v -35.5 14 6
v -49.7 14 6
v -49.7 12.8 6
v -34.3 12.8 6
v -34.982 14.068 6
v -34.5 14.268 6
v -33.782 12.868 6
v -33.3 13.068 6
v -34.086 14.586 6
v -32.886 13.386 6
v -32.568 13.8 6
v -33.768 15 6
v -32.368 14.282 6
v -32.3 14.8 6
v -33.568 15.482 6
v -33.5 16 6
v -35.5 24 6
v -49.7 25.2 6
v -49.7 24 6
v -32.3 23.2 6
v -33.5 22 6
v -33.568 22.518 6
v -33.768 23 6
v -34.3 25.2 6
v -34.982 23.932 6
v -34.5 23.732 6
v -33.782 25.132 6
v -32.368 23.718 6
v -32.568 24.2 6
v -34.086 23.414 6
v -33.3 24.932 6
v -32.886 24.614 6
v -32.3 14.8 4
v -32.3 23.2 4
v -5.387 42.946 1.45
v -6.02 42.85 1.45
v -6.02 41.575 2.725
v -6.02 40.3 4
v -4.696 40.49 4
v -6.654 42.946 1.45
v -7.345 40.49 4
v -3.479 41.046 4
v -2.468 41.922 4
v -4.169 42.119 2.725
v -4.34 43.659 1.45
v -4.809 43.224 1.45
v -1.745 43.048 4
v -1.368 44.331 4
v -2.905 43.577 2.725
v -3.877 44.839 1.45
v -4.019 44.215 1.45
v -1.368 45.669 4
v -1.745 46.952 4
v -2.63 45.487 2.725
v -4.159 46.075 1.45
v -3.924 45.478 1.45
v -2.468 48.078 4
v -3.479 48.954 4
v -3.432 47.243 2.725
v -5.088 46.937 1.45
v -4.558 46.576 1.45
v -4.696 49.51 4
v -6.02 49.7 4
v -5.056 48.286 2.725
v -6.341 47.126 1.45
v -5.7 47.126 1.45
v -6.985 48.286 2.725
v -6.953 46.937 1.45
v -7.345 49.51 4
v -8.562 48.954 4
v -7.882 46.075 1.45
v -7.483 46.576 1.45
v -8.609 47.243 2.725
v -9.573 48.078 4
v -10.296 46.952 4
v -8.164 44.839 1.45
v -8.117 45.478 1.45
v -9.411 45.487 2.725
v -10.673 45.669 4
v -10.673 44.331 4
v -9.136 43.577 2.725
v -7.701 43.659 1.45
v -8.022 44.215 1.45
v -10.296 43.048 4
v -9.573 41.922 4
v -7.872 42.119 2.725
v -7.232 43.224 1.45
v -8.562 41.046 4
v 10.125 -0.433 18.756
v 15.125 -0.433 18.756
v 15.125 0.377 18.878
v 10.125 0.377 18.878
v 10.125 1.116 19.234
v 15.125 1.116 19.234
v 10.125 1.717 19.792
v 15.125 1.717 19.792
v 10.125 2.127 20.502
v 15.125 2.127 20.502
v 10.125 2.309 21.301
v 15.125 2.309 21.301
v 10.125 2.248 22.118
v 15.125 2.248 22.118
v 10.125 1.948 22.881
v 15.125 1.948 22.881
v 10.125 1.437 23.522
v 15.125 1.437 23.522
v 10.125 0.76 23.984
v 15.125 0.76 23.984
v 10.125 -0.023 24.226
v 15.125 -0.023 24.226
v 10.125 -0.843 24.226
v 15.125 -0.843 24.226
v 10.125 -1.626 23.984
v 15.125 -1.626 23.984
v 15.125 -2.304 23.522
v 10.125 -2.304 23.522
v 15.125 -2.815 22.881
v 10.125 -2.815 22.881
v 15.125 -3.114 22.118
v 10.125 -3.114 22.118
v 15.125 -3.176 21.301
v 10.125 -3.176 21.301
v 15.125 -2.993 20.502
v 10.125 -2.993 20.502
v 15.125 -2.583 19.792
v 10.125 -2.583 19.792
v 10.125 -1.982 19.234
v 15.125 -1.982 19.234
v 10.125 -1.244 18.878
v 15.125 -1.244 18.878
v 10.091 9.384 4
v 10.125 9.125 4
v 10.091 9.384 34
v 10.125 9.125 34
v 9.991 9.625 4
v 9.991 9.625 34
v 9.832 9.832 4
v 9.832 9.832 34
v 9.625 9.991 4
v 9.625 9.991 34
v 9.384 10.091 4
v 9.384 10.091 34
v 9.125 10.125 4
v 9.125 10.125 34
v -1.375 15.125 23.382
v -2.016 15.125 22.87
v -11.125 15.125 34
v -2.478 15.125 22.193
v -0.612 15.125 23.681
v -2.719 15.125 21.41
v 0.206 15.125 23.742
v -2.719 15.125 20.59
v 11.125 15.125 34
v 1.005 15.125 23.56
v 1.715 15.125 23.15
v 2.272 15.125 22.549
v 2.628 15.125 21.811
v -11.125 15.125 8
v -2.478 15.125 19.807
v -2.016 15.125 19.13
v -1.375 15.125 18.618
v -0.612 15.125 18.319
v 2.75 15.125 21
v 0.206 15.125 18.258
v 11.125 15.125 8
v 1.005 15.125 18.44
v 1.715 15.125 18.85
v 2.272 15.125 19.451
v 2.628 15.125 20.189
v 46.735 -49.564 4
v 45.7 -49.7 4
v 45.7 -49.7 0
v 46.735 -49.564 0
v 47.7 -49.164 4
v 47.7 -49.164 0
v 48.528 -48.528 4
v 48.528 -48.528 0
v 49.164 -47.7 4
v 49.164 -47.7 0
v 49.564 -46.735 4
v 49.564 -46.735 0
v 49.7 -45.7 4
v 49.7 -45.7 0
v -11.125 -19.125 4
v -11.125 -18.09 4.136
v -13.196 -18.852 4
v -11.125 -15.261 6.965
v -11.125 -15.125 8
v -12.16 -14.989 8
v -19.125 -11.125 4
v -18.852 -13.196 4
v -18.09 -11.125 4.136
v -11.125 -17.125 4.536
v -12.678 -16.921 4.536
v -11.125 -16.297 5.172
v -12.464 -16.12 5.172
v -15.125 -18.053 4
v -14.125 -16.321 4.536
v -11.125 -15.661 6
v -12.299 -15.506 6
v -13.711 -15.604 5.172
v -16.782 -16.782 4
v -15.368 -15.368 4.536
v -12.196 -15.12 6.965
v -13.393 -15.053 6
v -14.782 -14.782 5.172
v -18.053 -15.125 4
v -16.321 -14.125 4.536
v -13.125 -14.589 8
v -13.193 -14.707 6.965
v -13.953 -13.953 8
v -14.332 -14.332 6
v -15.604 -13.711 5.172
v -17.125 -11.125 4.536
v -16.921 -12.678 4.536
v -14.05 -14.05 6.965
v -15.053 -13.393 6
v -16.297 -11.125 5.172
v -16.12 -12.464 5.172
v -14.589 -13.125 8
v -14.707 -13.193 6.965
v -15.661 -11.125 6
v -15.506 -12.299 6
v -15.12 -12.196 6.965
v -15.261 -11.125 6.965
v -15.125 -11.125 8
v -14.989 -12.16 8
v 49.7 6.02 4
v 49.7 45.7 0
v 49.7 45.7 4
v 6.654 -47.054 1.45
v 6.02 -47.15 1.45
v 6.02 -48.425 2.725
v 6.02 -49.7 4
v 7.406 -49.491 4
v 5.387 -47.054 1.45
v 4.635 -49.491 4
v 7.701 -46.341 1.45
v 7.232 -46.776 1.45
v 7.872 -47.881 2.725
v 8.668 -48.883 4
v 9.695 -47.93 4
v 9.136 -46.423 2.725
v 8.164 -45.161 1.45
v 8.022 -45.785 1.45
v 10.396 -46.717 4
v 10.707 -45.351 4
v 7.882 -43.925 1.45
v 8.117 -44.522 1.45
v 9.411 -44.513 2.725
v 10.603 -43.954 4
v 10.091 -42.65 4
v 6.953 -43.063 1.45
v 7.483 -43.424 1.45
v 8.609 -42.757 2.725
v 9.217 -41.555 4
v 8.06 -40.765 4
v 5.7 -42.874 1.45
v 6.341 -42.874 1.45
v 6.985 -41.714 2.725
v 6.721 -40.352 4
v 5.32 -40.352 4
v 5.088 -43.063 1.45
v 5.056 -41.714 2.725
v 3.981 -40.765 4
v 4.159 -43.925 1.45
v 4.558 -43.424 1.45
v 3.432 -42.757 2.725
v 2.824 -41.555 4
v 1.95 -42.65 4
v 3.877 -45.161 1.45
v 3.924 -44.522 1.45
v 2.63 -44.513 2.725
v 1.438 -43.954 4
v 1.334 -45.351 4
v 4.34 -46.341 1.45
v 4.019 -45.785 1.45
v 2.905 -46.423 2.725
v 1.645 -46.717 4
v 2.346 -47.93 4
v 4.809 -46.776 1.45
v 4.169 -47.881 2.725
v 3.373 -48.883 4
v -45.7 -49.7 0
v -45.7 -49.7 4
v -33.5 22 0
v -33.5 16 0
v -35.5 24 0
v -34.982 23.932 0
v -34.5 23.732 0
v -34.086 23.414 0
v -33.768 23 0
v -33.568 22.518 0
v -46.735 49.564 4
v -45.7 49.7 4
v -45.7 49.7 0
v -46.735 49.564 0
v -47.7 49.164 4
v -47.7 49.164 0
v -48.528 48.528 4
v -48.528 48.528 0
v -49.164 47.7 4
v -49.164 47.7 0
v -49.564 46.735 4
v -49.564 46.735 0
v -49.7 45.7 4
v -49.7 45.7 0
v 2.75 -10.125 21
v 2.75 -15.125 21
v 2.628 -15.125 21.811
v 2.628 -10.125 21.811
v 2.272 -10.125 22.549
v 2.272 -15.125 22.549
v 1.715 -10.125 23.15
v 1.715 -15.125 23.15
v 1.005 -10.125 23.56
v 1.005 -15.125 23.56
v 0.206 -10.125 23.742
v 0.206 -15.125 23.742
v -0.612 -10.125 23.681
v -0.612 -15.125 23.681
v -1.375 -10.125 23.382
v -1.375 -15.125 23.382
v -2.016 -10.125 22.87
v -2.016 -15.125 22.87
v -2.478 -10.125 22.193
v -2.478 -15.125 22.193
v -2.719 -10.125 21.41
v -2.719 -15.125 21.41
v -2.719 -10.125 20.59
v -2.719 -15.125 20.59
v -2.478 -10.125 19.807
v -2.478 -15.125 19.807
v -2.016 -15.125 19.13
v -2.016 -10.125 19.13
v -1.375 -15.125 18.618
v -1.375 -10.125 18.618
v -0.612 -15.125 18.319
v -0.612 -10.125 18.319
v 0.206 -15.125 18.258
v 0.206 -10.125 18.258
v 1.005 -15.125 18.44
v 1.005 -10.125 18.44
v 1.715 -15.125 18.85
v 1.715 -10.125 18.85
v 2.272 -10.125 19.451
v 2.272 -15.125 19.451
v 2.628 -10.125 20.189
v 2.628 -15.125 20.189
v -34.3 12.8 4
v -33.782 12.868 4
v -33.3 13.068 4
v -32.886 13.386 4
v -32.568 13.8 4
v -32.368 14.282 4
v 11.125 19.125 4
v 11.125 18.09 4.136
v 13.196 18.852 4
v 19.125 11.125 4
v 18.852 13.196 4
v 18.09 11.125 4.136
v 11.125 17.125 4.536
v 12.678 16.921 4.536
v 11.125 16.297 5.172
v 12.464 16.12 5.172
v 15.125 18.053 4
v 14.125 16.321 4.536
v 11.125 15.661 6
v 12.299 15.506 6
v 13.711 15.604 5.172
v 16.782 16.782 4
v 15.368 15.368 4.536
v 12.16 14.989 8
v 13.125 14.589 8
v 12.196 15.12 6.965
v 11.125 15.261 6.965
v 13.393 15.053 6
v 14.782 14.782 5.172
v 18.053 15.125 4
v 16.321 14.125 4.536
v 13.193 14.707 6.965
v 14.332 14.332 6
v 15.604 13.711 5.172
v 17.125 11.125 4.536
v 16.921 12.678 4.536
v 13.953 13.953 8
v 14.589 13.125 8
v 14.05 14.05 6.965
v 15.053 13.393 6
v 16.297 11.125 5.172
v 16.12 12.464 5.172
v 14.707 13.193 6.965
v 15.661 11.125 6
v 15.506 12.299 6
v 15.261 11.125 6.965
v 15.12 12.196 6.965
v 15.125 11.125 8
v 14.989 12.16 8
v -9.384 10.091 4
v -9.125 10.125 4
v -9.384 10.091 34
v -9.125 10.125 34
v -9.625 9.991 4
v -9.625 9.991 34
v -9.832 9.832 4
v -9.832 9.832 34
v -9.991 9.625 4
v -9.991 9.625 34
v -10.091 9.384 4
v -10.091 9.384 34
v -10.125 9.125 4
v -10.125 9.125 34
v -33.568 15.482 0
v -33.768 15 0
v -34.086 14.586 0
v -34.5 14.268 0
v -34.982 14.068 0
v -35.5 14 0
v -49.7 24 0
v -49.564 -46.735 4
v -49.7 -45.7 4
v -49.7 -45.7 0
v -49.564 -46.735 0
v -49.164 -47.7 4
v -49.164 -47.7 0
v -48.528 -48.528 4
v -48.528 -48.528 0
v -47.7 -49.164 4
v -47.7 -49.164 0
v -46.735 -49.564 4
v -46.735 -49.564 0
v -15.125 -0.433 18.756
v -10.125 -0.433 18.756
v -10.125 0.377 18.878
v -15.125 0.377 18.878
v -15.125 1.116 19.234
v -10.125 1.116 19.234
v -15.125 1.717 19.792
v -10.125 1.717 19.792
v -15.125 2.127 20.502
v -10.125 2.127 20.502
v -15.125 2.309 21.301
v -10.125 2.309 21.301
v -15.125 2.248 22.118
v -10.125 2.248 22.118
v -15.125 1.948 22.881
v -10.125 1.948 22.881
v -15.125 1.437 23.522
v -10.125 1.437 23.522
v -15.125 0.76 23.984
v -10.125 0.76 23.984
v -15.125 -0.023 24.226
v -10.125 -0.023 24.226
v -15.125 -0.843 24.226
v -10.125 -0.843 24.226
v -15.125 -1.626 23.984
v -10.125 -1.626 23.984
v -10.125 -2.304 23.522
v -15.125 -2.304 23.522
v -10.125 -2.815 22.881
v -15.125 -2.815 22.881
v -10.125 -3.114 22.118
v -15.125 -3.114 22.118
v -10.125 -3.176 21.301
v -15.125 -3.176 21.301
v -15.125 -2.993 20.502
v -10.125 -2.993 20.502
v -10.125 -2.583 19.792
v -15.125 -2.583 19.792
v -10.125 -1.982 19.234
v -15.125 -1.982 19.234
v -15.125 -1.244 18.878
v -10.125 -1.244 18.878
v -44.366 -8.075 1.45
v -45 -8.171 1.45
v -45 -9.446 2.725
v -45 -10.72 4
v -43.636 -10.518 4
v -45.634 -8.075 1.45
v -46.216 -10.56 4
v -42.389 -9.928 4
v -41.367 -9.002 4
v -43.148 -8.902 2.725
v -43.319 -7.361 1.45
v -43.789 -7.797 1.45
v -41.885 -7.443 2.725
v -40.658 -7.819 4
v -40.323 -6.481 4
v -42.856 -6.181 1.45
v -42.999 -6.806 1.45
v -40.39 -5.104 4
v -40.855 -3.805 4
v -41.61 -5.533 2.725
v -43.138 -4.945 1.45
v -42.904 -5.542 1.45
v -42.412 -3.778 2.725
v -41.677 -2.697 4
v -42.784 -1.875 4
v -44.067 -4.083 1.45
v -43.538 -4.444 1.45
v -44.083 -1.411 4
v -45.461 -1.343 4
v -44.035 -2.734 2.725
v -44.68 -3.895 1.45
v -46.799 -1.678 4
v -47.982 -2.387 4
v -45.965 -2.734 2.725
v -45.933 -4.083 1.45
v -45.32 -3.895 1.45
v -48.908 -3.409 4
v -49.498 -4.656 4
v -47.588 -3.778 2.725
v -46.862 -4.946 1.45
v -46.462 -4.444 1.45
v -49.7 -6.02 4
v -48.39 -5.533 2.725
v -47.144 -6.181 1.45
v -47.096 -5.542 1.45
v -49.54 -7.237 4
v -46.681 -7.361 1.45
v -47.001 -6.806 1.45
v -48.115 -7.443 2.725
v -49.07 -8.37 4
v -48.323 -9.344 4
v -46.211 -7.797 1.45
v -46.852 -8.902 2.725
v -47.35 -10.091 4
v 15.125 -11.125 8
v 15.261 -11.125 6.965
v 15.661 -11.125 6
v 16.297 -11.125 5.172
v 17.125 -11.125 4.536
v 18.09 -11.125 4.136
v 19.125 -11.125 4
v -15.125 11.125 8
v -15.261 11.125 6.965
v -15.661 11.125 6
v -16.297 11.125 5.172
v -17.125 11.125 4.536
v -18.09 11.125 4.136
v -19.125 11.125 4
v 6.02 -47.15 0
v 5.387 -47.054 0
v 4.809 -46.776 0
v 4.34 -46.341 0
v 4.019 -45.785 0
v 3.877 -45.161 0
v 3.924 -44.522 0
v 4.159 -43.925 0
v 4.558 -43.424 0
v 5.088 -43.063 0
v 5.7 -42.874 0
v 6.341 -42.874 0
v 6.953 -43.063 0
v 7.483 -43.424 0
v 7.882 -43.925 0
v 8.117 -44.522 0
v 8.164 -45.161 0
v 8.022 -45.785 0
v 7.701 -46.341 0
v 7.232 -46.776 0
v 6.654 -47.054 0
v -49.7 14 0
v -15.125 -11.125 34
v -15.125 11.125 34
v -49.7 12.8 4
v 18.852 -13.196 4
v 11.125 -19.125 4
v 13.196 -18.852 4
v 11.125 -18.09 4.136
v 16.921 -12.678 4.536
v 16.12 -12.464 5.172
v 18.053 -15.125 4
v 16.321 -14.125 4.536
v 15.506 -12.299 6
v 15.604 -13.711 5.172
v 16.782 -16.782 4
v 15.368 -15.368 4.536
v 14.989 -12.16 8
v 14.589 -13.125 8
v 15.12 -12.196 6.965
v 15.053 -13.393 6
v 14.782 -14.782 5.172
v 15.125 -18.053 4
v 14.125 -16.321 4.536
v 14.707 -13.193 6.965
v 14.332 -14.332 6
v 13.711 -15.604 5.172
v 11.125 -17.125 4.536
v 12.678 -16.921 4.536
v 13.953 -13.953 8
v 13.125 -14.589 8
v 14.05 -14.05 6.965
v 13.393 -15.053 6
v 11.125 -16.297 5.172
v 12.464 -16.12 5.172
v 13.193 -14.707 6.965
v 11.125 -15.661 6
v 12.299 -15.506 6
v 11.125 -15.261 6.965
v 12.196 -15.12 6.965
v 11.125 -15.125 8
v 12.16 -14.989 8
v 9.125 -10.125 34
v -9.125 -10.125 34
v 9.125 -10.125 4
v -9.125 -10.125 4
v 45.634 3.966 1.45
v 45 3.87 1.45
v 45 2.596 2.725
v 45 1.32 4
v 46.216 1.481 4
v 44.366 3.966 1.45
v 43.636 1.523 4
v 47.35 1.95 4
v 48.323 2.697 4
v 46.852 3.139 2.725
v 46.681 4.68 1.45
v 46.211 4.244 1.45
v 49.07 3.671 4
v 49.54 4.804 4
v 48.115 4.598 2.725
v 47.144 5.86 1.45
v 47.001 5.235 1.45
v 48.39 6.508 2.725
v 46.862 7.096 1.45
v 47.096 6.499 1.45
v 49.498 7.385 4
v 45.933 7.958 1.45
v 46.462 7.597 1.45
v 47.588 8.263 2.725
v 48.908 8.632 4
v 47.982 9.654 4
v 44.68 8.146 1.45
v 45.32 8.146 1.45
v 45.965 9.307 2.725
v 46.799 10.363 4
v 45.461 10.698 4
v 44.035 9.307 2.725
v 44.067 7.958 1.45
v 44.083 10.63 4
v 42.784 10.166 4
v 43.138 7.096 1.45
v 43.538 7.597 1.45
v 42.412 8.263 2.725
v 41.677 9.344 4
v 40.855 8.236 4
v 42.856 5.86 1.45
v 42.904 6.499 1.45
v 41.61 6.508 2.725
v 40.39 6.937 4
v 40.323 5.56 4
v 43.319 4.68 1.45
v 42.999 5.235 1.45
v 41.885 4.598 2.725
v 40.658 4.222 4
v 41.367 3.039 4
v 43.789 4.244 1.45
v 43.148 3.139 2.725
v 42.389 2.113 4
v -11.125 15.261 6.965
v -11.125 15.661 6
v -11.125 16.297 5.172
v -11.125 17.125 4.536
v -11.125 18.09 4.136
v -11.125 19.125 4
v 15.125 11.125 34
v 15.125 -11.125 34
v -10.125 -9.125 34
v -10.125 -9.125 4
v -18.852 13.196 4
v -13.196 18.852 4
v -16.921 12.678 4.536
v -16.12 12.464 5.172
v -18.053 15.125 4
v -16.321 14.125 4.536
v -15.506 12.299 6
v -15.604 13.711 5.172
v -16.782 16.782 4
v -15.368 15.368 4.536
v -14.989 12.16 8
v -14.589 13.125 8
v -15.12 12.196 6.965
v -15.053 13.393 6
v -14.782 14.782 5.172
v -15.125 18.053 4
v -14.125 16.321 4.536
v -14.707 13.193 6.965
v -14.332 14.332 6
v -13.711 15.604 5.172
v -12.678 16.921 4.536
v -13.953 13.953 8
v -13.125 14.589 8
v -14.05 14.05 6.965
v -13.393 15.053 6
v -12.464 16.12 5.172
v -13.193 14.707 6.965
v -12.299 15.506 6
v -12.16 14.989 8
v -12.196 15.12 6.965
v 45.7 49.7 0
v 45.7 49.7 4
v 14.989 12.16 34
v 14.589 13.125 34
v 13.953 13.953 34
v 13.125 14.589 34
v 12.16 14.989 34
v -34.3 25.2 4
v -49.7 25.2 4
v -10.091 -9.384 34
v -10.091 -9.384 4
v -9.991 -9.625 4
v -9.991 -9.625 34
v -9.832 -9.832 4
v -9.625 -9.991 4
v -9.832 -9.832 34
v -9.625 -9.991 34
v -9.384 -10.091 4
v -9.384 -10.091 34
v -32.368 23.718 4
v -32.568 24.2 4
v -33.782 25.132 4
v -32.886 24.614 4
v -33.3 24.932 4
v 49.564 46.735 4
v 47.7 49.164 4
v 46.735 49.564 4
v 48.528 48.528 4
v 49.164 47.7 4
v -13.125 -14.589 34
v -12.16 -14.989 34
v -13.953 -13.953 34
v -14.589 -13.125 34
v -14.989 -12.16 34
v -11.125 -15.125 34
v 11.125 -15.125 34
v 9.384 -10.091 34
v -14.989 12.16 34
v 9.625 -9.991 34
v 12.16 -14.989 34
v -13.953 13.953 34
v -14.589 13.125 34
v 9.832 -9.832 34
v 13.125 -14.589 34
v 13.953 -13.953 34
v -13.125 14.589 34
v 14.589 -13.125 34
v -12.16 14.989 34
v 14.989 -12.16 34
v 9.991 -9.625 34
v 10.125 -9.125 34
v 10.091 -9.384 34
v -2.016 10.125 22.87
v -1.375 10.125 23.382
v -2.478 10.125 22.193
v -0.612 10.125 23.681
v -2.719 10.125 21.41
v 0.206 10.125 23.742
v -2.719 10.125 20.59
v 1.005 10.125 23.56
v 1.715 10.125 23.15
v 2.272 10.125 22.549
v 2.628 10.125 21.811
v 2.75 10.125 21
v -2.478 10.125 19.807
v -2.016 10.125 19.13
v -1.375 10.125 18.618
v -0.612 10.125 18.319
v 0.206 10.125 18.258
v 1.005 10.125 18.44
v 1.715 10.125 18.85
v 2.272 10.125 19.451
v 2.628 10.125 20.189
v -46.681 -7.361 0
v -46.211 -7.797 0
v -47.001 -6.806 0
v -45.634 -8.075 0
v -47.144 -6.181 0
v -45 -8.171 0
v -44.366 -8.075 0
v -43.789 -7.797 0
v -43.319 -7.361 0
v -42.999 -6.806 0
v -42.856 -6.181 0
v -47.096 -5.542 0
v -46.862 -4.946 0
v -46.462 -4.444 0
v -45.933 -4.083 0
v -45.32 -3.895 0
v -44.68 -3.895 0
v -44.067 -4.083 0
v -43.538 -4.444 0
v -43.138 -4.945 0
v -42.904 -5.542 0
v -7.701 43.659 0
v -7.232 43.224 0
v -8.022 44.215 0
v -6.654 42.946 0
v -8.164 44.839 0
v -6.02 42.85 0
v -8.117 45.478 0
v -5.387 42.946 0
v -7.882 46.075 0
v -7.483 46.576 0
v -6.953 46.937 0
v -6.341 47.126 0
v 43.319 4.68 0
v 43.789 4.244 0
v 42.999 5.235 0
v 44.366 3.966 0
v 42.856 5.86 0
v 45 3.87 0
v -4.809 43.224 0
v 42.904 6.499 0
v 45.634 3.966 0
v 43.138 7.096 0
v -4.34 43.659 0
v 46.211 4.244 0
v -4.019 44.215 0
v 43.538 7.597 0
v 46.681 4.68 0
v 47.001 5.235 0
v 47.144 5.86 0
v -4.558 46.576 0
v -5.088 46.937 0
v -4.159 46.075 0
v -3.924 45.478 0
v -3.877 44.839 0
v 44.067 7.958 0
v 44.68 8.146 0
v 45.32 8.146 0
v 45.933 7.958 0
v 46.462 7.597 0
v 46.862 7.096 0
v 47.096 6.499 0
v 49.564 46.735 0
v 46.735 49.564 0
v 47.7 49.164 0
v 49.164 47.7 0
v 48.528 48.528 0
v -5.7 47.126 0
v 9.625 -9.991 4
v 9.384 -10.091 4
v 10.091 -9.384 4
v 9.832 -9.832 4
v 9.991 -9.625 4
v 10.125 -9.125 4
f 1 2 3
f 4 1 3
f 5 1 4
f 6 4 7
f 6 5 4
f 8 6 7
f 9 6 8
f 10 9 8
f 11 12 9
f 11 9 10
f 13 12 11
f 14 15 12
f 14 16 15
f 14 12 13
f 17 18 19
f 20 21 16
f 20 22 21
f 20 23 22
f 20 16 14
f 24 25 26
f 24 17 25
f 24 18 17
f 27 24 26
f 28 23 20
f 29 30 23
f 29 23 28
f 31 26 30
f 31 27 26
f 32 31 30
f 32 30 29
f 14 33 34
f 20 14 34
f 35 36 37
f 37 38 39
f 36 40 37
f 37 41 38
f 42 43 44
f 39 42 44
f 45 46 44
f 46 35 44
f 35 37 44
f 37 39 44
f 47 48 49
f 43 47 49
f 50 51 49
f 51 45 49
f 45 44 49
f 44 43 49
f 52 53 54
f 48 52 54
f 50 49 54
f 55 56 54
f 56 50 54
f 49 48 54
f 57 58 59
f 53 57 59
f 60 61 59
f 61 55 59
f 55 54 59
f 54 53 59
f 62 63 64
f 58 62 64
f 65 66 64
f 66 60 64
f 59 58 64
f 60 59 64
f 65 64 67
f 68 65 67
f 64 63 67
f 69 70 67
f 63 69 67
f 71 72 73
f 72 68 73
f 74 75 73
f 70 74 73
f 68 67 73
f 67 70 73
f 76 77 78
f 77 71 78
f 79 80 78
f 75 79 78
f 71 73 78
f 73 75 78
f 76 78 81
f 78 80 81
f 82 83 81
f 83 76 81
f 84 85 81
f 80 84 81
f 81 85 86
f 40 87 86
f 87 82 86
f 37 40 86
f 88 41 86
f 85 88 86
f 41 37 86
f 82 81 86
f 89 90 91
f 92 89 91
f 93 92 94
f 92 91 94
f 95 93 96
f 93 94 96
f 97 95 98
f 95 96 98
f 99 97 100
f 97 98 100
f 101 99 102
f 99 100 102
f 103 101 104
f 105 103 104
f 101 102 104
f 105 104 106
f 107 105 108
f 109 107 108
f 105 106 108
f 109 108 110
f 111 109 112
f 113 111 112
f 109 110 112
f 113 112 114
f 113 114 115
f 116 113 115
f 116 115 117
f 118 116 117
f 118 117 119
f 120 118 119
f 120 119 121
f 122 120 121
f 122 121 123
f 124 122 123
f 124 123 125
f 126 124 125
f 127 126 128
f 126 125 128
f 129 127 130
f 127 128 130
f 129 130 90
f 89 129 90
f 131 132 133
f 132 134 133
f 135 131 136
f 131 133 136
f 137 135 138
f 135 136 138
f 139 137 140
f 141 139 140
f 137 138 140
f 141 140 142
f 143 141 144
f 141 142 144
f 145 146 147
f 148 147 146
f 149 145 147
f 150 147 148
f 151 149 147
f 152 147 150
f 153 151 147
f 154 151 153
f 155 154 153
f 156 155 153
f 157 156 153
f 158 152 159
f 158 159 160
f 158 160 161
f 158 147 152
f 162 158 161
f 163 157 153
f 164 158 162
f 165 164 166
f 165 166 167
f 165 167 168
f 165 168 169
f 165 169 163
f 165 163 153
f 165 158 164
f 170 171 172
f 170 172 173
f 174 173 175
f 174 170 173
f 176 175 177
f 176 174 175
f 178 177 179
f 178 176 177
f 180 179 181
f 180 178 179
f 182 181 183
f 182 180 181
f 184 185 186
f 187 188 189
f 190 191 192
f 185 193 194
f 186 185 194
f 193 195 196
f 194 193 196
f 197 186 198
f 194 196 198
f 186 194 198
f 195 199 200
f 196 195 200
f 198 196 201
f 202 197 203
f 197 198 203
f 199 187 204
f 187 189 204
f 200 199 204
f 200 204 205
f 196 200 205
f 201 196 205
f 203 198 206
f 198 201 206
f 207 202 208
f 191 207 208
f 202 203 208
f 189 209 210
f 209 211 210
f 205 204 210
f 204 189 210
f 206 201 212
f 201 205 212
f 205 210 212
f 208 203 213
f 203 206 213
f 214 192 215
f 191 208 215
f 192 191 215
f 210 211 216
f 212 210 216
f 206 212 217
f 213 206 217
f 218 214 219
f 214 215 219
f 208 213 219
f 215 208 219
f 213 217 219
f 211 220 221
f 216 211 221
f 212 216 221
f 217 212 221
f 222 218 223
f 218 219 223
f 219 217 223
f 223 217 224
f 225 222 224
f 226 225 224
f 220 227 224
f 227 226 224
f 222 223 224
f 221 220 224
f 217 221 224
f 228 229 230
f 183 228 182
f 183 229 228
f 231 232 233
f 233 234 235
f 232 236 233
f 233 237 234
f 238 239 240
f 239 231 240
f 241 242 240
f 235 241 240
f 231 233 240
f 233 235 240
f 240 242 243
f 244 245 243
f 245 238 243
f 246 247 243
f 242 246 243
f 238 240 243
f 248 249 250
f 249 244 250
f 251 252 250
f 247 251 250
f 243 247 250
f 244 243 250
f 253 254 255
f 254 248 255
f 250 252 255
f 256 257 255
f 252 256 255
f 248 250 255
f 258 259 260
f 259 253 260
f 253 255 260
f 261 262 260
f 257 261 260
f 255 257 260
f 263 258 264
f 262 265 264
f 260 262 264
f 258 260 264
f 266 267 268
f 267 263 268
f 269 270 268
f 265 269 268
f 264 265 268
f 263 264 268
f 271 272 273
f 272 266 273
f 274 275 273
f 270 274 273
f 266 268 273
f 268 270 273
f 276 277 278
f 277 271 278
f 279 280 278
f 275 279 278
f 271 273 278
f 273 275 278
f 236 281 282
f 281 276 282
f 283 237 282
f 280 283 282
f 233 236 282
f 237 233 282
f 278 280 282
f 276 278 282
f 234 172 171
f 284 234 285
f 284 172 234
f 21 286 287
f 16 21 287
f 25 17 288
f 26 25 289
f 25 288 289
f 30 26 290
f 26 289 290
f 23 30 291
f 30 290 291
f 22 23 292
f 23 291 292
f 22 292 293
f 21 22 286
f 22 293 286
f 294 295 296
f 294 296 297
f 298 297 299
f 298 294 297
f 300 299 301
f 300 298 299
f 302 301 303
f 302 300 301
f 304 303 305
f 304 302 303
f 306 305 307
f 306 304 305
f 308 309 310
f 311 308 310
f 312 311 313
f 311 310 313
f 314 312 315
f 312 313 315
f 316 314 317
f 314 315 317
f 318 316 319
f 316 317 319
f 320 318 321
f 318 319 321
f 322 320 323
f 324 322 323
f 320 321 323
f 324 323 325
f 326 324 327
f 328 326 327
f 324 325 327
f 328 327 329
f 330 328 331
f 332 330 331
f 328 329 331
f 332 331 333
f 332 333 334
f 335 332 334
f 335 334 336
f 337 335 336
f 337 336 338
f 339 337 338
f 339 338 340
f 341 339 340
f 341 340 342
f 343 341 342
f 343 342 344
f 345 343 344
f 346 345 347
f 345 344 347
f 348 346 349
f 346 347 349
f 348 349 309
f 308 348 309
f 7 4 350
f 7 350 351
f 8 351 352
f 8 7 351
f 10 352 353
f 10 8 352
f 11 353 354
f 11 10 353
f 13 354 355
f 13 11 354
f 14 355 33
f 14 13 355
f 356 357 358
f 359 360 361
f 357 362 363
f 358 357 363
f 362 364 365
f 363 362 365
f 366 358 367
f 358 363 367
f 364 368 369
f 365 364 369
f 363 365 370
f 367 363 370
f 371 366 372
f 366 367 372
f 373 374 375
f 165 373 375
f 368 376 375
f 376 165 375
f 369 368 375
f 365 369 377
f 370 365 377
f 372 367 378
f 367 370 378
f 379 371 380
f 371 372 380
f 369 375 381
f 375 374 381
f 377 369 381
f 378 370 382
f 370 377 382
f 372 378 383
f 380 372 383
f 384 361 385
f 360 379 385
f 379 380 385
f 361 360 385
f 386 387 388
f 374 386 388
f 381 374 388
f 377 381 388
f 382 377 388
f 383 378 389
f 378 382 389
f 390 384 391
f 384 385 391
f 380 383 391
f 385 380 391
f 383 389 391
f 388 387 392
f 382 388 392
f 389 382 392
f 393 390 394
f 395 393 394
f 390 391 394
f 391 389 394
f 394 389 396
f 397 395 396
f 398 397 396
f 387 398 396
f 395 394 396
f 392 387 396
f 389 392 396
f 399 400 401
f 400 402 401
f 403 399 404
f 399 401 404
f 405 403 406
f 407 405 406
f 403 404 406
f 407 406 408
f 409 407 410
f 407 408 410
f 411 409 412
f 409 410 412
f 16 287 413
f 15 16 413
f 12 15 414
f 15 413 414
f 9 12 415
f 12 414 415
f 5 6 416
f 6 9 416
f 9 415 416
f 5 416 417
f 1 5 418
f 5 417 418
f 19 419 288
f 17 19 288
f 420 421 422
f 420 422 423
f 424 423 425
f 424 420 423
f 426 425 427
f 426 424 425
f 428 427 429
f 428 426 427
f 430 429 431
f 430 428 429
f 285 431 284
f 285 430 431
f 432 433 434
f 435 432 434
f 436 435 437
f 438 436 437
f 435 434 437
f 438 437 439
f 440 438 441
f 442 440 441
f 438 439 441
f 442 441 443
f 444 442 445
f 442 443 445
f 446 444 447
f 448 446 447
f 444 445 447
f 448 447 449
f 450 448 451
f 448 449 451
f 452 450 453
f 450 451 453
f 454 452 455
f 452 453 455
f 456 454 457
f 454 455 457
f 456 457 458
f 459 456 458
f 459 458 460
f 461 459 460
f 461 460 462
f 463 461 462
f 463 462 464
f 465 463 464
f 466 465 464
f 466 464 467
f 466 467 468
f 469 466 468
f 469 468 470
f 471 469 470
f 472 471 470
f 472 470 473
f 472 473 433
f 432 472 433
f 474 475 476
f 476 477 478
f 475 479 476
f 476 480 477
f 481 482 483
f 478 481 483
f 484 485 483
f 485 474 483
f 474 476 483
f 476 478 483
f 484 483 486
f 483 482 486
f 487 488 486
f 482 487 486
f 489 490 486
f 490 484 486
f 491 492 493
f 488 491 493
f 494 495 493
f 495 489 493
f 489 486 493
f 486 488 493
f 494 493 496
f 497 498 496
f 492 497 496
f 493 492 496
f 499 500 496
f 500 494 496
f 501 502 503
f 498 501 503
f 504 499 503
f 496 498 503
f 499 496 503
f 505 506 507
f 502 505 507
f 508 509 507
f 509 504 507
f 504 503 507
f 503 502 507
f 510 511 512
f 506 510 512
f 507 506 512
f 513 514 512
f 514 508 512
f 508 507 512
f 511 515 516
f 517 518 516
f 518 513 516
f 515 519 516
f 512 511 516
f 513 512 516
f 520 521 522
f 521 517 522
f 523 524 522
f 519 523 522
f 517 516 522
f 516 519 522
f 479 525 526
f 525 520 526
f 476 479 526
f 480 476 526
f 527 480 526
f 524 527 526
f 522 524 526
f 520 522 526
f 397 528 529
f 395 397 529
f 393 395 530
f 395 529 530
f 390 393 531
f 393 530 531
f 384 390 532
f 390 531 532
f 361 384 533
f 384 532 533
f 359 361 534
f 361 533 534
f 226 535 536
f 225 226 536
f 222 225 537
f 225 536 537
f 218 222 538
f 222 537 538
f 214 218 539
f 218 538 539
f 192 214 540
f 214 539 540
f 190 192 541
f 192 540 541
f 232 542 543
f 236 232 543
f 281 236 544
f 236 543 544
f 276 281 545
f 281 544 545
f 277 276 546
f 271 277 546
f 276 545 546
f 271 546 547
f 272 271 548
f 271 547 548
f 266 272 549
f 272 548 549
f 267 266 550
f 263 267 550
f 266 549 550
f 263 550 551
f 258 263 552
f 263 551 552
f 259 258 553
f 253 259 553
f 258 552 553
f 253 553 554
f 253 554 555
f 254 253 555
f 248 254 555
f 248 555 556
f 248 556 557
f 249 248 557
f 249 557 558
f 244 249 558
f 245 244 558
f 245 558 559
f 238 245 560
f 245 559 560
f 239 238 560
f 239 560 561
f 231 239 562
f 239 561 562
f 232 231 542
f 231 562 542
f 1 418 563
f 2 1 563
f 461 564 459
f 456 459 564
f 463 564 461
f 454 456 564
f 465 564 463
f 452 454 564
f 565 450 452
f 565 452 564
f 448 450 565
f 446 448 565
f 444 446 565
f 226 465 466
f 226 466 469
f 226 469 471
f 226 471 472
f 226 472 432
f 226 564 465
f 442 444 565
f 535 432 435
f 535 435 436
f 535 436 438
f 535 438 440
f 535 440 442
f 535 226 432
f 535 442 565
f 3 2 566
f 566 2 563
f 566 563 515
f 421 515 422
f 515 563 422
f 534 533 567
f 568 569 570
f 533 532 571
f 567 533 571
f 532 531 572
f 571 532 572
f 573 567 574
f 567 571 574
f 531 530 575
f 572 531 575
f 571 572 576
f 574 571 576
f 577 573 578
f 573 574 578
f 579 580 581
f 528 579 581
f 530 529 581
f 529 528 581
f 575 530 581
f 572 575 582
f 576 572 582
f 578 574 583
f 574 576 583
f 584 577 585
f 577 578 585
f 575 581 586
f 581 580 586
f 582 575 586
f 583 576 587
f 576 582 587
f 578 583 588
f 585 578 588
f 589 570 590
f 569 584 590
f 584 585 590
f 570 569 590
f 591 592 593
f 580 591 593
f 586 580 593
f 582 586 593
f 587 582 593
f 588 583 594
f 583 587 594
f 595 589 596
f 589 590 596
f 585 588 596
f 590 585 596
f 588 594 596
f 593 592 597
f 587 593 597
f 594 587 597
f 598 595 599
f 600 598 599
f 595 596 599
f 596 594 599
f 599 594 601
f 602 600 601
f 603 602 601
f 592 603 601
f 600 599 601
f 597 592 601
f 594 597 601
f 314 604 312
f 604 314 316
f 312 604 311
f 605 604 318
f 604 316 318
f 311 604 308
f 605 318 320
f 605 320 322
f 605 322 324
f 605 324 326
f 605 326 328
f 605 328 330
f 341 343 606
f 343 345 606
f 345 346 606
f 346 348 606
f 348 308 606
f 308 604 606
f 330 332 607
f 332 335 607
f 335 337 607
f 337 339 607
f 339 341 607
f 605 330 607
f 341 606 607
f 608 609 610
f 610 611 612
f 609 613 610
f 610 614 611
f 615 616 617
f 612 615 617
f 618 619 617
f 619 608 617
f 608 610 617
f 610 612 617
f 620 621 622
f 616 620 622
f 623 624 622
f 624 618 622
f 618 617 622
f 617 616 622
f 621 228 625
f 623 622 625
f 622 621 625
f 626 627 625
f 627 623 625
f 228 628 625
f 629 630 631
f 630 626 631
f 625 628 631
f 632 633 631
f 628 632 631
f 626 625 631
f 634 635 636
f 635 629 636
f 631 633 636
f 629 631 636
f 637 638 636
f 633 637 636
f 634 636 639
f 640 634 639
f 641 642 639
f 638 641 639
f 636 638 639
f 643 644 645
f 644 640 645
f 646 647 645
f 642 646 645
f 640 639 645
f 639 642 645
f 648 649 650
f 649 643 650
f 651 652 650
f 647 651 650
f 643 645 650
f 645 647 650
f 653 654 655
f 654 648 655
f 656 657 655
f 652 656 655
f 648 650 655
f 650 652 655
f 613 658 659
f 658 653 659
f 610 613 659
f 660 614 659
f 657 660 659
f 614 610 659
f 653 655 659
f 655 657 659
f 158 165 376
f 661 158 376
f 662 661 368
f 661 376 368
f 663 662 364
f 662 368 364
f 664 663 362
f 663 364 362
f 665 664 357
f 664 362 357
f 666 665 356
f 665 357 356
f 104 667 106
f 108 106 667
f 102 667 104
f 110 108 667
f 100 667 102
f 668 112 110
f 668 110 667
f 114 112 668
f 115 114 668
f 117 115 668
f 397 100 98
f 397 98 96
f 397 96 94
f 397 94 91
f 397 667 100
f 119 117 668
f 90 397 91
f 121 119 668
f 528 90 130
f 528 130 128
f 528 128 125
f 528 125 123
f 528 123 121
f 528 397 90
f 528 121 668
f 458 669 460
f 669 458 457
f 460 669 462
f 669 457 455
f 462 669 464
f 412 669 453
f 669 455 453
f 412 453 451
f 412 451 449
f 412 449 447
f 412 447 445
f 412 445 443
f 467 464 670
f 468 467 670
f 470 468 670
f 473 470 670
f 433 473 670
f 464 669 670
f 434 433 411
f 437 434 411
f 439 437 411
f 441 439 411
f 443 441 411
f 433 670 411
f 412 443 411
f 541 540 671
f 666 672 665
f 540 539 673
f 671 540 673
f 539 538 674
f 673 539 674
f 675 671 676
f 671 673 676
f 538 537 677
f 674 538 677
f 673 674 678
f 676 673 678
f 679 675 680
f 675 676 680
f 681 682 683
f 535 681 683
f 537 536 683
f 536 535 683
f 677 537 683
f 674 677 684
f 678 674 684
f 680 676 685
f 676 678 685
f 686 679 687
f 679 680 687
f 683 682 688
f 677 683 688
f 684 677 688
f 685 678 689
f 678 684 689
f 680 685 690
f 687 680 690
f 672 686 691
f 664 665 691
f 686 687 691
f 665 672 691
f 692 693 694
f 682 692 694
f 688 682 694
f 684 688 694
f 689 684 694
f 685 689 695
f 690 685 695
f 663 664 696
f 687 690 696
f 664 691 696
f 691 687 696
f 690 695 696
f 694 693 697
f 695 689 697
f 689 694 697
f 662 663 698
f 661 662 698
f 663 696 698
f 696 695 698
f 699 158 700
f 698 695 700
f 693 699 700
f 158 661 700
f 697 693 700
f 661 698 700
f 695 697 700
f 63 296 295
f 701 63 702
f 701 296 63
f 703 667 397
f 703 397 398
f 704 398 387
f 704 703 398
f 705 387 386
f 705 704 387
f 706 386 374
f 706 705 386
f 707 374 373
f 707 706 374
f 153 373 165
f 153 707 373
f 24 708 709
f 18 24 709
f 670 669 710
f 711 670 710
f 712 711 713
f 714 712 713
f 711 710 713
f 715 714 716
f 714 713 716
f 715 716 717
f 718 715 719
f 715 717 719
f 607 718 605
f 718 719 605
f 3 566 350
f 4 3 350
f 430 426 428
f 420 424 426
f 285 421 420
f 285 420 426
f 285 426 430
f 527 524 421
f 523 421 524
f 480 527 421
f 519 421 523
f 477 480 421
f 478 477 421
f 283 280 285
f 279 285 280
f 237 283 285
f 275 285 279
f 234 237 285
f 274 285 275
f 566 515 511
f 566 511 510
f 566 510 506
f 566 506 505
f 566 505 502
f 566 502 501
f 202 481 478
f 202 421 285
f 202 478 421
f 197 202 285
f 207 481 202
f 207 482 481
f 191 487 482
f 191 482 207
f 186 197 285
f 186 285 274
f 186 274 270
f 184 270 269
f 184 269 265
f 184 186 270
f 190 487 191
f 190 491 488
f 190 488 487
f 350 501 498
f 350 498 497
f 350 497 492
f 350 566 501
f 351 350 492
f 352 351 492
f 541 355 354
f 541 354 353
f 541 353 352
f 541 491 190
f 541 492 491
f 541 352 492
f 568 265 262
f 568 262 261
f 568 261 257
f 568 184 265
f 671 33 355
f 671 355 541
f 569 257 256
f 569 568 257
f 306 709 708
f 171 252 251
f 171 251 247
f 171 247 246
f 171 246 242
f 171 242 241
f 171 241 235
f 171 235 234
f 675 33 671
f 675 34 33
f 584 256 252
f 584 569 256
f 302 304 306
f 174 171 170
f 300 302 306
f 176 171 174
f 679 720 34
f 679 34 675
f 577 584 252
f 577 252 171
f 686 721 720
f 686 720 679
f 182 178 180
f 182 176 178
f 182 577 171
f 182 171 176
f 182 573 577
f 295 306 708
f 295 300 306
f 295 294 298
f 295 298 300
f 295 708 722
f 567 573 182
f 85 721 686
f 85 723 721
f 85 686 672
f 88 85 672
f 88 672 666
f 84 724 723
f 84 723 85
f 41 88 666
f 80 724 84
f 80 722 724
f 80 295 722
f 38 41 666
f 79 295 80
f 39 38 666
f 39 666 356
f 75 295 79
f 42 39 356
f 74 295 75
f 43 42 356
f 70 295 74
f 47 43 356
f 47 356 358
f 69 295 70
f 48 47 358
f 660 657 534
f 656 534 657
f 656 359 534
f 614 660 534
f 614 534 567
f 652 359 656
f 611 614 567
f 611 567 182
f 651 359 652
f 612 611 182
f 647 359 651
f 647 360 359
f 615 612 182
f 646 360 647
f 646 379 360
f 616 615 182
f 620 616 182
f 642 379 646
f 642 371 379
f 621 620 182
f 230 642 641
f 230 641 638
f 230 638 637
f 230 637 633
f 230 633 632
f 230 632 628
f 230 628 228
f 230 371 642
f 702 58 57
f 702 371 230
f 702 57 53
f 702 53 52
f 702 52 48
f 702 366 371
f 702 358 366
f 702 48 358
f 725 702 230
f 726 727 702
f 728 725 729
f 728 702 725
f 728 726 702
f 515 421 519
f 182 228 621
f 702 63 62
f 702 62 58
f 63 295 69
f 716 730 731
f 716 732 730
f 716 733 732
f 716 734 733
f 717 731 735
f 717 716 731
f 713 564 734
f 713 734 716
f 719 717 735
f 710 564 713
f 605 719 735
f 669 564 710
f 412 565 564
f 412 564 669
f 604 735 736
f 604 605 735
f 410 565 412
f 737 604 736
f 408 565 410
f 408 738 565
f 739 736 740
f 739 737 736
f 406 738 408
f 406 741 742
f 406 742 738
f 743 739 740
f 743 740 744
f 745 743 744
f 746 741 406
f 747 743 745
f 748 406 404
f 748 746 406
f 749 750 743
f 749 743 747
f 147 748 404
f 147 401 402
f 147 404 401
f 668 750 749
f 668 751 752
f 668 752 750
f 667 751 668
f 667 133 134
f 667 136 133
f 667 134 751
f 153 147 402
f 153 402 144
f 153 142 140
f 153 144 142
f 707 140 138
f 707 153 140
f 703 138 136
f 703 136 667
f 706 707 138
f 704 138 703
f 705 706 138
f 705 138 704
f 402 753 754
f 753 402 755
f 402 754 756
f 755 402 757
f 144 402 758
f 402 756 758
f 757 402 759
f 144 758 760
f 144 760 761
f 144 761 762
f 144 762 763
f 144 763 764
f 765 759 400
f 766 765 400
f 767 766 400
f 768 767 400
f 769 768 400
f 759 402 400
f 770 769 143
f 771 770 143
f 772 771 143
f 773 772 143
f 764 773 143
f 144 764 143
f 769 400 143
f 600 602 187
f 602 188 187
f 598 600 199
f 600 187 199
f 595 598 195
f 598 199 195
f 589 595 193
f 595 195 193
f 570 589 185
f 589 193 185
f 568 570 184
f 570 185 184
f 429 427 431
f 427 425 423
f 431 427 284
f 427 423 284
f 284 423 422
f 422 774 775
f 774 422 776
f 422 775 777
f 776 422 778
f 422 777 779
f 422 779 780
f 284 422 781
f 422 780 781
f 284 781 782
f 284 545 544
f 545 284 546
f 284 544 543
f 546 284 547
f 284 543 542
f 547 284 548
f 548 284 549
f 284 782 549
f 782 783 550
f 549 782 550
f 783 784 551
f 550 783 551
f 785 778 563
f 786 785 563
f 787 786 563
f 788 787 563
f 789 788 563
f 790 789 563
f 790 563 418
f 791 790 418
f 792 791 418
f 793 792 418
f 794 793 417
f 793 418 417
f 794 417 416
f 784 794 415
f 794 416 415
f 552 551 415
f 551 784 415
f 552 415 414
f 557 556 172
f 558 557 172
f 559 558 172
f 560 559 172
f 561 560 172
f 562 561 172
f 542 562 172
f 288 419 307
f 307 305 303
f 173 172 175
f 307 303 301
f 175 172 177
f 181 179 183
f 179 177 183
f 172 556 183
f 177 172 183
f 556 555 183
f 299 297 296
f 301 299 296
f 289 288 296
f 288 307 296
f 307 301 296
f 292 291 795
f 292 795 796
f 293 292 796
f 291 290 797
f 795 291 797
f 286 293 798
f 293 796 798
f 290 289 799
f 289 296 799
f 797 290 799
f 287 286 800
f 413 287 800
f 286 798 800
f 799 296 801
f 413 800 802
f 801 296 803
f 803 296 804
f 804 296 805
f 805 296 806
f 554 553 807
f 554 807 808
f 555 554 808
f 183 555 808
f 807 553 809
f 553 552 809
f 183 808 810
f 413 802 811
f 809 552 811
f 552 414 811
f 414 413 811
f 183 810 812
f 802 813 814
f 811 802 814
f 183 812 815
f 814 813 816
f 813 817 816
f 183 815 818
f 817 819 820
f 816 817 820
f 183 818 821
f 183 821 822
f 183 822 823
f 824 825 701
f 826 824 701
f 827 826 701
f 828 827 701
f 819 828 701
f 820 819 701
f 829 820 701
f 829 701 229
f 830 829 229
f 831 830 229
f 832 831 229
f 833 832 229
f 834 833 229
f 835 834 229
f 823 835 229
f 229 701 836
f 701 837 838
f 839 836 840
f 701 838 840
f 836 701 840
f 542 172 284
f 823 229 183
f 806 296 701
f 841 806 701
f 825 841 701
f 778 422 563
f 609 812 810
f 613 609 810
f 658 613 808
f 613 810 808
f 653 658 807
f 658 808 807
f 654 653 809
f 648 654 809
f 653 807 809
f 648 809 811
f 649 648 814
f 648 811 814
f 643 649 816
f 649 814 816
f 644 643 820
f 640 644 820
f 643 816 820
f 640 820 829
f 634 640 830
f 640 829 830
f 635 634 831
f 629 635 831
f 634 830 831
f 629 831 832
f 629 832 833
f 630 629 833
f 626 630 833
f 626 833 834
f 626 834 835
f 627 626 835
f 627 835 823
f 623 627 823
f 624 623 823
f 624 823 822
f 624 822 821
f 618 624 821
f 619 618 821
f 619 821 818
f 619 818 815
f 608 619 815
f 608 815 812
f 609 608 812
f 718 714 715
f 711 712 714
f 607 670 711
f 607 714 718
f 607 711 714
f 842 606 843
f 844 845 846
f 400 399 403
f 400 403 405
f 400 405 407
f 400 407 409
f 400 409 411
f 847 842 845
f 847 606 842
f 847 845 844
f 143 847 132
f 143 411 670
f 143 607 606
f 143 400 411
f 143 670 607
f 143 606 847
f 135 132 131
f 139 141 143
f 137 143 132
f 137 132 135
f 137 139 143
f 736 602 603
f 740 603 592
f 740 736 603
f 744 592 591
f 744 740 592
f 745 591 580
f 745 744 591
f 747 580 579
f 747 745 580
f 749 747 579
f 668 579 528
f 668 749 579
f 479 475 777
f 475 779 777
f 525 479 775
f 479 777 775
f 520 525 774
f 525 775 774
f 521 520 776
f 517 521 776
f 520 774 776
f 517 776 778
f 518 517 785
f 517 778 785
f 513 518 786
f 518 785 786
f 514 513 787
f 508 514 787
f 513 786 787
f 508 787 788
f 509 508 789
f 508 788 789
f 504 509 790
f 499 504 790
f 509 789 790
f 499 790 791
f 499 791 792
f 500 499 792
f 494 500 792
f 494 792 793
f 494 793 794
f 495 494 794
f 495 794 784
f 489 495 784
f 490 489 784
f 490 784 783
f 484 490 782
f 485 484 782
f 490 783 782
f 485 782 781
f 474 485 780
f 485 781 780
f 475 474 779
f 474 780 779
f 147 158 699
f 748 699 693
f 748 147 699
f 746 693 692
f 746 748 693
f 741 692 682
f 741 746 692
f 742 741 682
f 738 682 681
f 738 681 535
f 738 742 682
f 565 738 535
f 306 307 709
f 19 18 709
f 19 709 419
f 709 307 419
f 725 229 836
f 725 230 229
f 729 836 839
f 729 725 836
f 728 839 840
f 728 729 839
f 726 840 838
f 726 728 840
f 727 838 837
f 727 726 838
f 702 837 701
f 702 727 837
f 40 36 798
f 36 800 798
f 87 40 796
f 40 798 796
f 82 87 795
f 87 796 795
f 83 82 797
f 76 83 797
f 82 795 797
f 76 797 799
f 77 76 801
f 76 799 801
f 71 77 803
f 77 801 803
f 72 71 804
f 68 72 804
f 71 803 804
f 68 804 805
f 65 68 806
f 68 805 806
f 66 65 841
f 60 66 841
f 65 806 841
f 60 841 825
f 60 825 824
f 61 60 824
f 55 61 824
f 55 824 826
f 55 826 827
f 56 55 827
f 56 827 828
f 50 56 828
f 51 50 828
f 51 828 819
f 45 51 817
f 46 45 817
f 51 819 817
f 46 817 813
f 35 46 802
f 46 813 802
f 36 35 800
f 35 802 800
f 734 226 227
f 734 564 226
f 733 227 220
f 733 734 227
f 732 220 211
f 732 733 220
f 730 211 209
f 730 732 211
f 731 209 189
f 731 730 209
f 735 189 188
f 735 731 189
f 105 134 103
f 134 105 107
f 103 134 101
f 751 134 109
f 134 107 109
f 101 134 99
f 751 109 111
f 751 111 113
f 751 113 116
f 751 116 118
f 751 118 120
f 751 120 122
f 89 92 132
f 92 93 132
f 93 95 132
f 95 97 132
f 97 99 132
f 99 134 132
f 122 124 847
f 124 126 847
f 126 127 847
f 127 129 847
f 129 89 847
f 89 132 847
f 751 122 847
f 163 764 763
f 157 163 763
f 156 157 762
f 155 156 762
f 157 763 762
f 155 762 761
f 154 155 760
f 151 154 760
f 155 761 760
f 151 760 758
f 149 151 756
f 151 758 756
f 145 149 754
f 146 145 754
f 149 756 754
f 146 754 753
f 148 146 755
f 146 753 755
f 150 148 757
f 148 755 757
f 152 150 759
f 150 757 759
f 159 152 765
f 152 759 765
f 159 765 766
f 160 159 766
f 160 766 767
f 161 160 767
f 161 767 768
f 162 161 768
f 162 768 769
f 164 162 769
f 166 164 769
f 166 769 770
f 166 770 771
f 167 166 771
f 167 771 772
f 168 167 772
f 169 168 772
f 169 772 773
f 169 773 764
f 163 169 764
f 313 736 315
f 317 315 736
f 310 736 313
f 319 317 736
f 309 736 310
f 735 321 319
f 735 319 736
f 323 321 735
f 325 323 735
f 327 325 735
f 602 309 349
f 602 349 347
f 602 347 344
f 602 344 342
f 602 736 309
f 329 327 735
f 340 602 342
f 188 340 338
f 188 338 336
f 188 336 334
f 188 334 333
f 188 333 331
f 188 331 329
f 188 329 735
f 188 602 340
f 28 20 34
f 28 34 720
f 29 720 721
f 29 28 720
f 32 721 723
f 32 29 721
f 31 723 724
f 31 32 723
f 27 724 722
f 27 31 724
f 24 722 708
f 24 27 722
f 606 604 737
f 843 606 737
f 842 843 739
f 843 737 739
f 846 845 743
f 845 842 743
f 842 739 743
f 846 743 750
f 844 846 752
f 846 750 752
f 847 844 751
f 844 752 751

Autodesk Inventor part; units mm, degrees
ref_plane "YZ Plane" through (0, 0, 0) normal (1, 0, 0) x (0, 1, 0)
ref_plane "XZ Plane" through (0, 0, 0) normal (0, 1, 0) x (-1, 0, 0)
ref_plane "XY Plane" through (0, 0, 0) normal (0, 0, 1) x (1, 0, 0)
sketch "Sketch1" plane through (0, 0, 0) normal (0, 0, 1) x (1, 0, 0)
  line L0 (-49.7, 49.7) -> (49.7, 49.7)
  line L1 (49.7, 49.7) -> (49.7, -49.7)
  line L2 (49.7, -49.7) -> (-49.7, -49.7)
  line L3 (-49.7, -49.7) -> (-49.7, 49.7)
  line L4 (-49.7, 49.7) -> (49.7, -49.7) construction
  line L5 (49.7, 49.7) -> (-49.7, -49.7) construction
  line L6 (44, -44) -> (-44, -44)
  line L7 (-44, -44) -> (-44, 44)
  line L8 (-44, 44) -> (44, 44)
  line L9 (44, 44) -> (44, -44)
  line L10 (44, -44) -> (-44, 44) construction
  line L11 (-44, -44) -> (44, 44) construction
  circle A0 centre (-44, 44) radius 1.75
  circle A1 centre (44, 44) radius 1.75
  circle A2 centre (-44, -44) radius 1.75
  circle A3 centre (44, -44) radius 1.75
  point P0 (0, 0)
  dimension "d0" = 99.4
  dimension "d1" = 99.4
  dimension "d2" = 88
  dimension "d3" = 88
  dimension "d4" = 3.5
  dimension "d5" = 3.5
  dimension "d6" = 3.5
  dimension "d7" = 3.5
extrude "Extrusion1" add sketch "Sketch1" along normal blind 4 contours L0 L1 L2 L3 | A2 L7 L6 | A2 L7 A0 L8 A1 L9 A3 L6 | L6 L7 A2 | A3 L9 L6 | L6 L9 A3 | A0 L8 L7 | L7 L8 A0 | A1 L8 L9 | L9 L8 A1
fillet "Fillet1" radius 4 4 edges at (-49.7, -49.7, 2) (49.7, -49.7, 2) (-49.7, 49.7, 2) (49.7, 49.7, 2)
sketch "Sketch2" plane through (0, 0, 4) normal (0, 0, 1) x (1, 0, 0)
  line L0 (10.125, -10.125) -> (-10.125, -10.125)
  line L1 (-10.125, -10.125) -> (-10.125, 10.125)
  line L2 (-10.125, 10.125) -> (10.125, 10.125)
  line L3 (10.125, 10.125) -> (10.125, -10.125)
  line L4 (10.125, -10.125) -> (-10.125, 10.125) construction
  line L5 (-10.125, -10.125) -> (10.125, 10.125) construction
  line L6 (-15.125, 15.125) -> (15.125, 15.125)
  line L7 (15.125, 15.125) -> (15.125, -15.125)
  line L8 (15.125, -15.125) -> (-15.125, -15.125)
  line L9 (-15.125, -15.125) -> (-15.125, 15.125)
  line L10 (-15.125, 15.125) -> (15.125, -15.125) construction
  line L11 (15.125, 15.125) -> (-15.125, -15.125) construction
  point P0 (0, 0)
  point P1 (0, -15.125)
  dimension "d15" = 20.25
  dimension "d16" = 20.25
  dimension "d17" = 5
extrude "Extrusion2" add sketch "Sketch2" along normal blind 30
fillet "Fillet3" radius 1 4 edges at (-10.125, -10.125, 19) (10.125, -10.125, 19) (10.125, 10.125, 19) (-10.125, 10.125, 19)
fillet "Fillet4" radius 4 8 edges at (15.125, -15.125, 19) (15.125, 15.125, 19) (-15.125, 15.125, 19) (-15.125, -15.125, 19) (0, -15.125, 4) (15.125, 0, 4) (0, 15.125, 4) (-15.125, 0, 4)
sketch "Sketch3" plane through (15.125, -11.125, 34) normal (1, 0, 0) x (0, 0, -1)
  line L0 (30, 22.25) -> (26, 22.25) projected
  line L1 (0, 0) -> (26, 22.25)
  circle A0 centre (12.4937, 10.6917) radius 2.75
  point P0 (34, 11.125)
  dimension "d22" = 5.5
extrude "Extrusion3" cut sketch "Sketch3" against normal through all
sketch "Sketch4" plane through (-11.125, -15.125, 8) normal (0, -1, 0) x (1, 0, 0)
  line L0 (-4, 26) -> (0, 26) projected
  line L1 (0, 0) -> (22.25, 0) projected
  line L2 (0, 26) -> (22.25, 0)
  circle A0 centre (11.125, 13) radius 2.75
  point P0 (11.125, -8)
  point P1 (9.337, 15.0894)
  point P2 (12.913, 10.9106)
  dimension "d25" = 5.5
extrude "Extrusion4" cut sketch "Sketch4" against normal through all
sketch "Sketch5" plane through (0, 0, 4) normal (0, 0, 1) x (1, 0, 0)
  line L0 (-43.5, 24) -> (-33.5, 24)
  line L1 (-33.5, 24) -> (-33.5, 14)
  line L2 (-33.5, 14) -> (-43.5, 14)
  line L3 (-43.5, 14) -> (-43.5, 24)
  line L4 (-48.7, 44.7) -> (-48.7, -44.7) projected
  line L5 (44.7, 48.7) -> (-44.7, 48.7) projected
  line L6 (-49.7, 45.7) -> (-49.7, -45.7) projected
  point P0 (0, 0)
  point P1 (-49.3, 43.8338)
  point P2 (-49.3, -43.8338)
  point P3 (43.8338, 49.3)
  point P4 (-43.8338, 49.3)
  dimension "d31" = 10
  dimension "d32" = 10
  dimension "d33" = 24.7
  dimension "d57" = 6.2
extrude "Extrusion5" cut sketch "Sketch5" against normal blind 10
fillet "Fillet5" radius 2 4 edges at (-43.5, 24, 2) (-33.5, 24, 2) (-33.5, 14, 2) (-43.5, 14, 2)
sketch "Sketch6" plane through (0, 0, 4) normal (0, 0, 1) x (1, 0, 0)
  line L0 (-41.5, 14) -> (-35.5, 14) projected
  line L1 (-41.5, 14) -> (-49.7, 14)
  line L2 (-49.7, 14) -> (-49.7, 24)
  line L3 (-49.7, 24) -> (-41.5, 24)
  line L4 (-41.5, 24) -> (-41.5, 14)
  line L5 (-49.7, 45.7) -> (-49.7, -45.7) projected
  point P0 (0, 0)
  point P1 (-35.5, 24)
  point P2 (-49.3, 43.8338)
  point P3 (-49.3, -43.8338)
extrude "Extrusion6" cut sketch "Sketch6" against normal blind 10
sketch "Sketch7" plane through (0, 0, 4) normal (0, 0, 1) x (1, 0, 0)
  arc A0 (11.125, -19.125) -> (19.125, -11.125) centre (11.125, -11.125) ccw projected
  line L0 (-11.125, -19.125) -> (11.125, -19.125) projected
  arc A1 (-19.125, -11.125) -> (-11.125, -19.125) centre (-11.125, -11.125) ccw projected
  line L1 (-19.125, 11.125) -> (-19.125, -11.125) projected
  arc A2 (-11.125, 19.125) -> (-19.125, 11.125) centre (-11.125, 11.125) ccw projected
  line L2 (11.125, 19.125) -> (-11.125, 19.125) projected
  arc A3 (19.125, 11.125) -> (11.125, 19.125) centre (11.125, 11.125) ccw projected
  line L3 (19.125, -11.125) -> (19.125, 11.125) projected
  line L4 (-35.5, 14) -> (-49.7, 14) projected
  line L5 (-49.7, 14) -> (-49.7, -45.7) projected
  arc A4 (-49.7, -45.7) -> (-45.7, -49.7) centre (-45.7, -45.7) ccw projected
  line L6 (-45.7, -49.7) -> (45.7, -49.7) projected
  arc A5 (45.7, -49.7) -> (49.7, -45.7) centre (45.7, -45.7) ccw projected
  line L7 (49.7, -45.7) -> (49.7, 45.7) projected
  arc A6 (49.7, 45.7) -> (45.7, 49.7) centre (45.7, 45.7) ccw projected
  line L8 (45.7, 49.7) -> (-45.7, 49.7) projected
  arc A7 (-45.7, 49.7) -> (-49.7, 45.7) centre (-45.7, 45.7) ccw projected
  line L9 (-49.7, 24) -> (-35.5, 24) projected
  arc A8 (-33.5, 22) -> (-35.5, 24) centre (-35.5, 22) ccw projected
  line L10 (-33.5, 22) -> (-33.5, 16) projected
  arc A9 (-35.5, 14) -> (-33.5, 16) centre (-35.5, 16) ccw projected
  line L11 (-49.7, 12.8) -> (-32.3, 12.8)
  line L12 (-32.3, 12.8) -> (-32.3, 25.2)
  line L13 (-32.3, 25.2) -> (-49.7, 25.2)
  line L14 (-49.7, 25.2) -> (-49.7, 12.8)
  line L15 (-49.7, 45.7) -> (-49.7, 24) projected
  point P0 (0, 0)
  point P1 (-42.6, 24)
  dimension "d40" = 1.2
  dimension "d41" = 1.2
  dimension "d42" = 1.2
extrude "Extrusion7" add sketch "Sketch7" along normal blind 2 contours A9 L10 A8 L9 L14 L13 L12 L11 L5 L4
fillet "Fillet8" radius 2 2 edges at (-32.3, 25.2, 5) (-32.3, 12.8, 5)
sketch "Sketch8" plane through (0, 0, 4) normal (0, 0, 1) x (1, 0, 0)
  line L0 (45, 6.0205) -> (-45, 6.0205)
  line L1 (-45, 6.0205) -> (-45, -6.0205)
  line L2 (-45, -6.0205) -> (45, -6.0205)
  line L3 (45, -6.0205) -> (45, 6.0205)
  line L4 (45, 6.0205) -> (-45, -6.0205) construction
  line L5 (-45, 6.0205) -> (45, -6.0205) construction
  line L6 (6.0205, -45) -> (-6.0205, -45)
  line L7 (-6.0205, -45) -> (-6.0205, 45)
  line L8 (-6.0205, 45) -> (6.0205, 45)
  line L9 (6.0205, 45) -> (6.0205, -45)
  line L10 (6.0205, -45) -> (-6.0205, 45) construction
  line L11 (-6.0205, -45) -> (6.0205, 45) construction
  point P0 (0, 0)
  dimension "d46" = 90
  dimension "d47" = 12.041
  dimension "d48" = 12.041
  dimension "d49" = 90
hole "Hole1" at (-45, -6.0205, 4) at (45, 6.0205, 4) at (6.0205, -45, 4) at (-6.0205, 45, 4) direction (0, 0, -1) diameter 4.3 end through all countersink diameter 9.4 countersink angle 90 clearance for "Countersunk Flat Head Screw DIN EN ISO 2009" size "M4" standard "DIN"
properties part number "Lid"
